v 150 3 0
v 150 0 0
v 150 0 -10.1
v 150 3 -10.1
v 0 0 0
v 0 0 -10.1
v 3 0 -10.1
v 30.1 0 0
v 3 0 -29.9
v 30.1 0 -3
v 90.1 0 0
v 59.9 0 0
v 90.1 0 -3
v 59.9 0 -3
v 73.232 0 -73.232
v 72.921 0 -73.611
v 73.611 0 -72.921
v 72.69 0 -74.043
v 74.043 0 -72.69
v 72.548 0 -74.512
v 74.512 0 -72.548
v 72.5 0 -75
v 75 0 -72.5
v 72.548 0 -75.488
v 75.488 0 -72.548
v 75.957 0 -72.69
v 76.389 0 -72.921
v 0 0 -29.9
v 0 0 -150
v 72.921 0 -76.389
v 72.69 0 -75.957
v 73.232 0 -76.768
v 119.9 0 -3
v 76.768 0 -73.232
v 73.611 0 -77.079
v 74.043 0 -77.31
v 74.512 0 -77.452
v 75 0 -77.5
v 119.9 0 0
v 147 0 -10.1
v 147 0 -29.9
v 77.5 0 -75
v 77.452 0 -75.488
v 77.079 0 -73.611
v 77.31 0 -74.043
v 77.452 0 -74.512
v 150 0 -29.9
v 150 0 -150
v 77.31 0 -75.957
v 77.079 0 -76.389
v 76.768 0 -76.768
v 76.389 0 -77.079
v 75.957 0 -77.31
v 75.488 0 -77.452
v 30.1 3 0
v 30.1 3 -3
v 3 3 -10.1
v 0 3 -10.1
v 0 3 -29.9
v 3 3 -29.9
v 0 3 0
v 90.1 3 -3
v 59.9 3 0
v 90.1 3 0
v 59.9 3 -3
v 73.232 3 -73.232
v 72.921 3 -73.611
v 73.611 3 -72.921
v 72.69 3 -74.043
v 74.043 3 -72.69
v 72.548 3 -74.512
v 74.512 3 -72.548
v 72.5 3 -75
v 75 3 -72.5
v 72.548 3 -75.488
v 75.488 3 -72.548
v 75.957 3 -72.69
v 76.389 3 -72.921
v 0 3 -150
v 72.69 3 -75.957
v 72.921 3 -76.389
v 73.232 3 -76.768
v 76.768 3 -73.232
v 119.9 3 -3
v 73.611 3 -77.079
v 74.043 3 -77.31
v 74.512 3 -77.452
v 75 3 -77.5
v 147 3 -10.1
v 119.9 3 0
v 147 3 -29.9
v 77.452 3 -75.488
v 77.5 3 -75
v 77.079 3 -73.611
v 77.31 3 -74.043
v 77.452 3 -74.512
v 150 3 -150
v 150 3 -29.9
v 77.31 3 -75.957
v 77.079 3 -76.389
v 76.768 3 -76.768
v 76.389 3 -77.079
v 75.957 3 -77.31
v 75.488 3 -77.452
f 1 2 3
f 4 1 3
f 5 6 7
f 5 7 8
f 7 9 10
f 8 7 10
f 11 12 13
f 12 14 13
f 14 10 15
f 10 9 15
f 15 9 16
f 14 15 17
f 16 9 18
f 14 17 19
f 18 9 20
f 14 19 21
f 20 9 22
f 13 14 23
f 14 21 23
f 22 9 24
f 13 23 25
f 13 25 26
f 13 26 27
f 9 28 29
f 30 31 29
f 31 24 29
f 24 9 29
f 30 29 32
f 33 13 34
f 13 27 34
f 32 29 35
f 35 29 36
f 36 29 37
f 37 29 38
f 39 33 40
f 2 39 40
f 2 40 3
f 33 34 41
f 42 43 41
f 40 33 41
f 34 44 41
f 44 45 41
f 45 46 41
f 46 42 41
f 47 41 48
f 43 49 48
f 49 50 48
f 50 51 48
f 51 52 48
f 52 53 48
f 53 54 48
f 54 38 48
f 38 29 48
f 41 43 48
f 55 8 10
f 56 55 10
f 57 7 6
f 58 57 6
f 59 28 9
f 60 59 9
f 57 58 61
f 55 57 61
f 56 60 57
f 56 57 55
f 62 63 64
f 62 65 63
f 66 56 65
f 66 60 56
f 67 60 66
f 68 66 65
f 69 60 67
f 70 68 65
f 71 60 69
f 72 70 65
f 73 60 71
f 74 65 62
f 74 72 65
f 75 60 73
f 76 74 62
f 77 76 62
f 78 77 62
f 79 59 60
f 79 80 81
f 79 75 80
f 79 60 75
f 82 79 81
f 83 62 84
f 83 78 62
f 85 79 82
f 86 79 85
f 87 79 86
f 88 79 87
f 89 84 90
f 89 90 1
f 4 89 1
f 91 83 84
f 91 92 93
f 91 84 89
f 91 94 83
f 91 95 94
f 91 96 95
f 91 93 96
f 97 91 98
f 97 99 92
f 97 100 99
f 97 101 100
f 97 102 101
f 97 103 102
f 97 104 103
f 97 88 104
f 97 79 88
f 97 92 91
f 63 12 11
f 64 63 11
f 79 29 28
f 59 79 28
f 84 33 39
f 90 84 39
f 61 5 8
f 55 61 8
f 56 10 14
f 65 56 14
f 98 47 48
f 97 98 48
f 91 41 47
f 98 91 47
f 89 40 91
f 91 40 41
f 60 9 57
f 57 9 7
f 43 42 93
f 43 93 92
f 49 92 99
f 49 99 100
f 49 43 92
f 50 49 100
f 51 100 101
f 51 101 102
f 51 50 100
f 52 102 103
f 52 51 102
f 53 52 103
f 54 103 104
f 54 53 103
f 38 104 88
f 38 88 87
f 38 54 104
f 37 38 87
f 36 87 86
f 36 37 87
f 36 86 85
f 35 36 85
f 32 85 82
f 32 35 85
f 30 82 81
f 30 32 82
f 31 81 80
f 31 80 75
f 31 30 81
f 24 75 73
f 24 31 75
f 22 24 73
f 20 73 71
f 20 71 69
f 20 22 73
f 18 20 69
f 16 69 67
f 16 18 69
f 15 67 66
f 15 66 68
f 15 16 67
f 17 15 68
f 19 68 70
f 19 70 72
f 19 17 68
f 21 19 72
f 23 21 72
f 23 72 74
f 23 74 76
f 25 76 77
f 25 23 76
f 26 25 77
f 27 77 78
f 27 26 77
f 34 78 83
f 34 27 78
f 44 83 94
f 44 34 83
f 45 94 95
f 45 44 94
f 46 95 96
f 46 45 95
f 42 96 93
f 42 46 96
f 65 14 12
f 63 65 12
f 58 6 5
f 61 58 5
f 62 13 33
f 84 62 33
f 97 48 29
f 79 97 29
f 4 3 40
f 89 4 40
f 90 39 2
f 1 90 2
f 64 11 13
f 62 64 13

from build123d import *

# Parameters (mm, degrees)
SKETCH1_R           = 2.5
BOSS_EXTRUDE1_DEPTH = 3


with BuildPart() as part:
    # Sketch1 → Boss-Extrude1 (new body)
    with BuildSketch(Plane(origin=(0, 0, 0), x_dir=(1, 0, 0), z_dir=(0, 1, 0))):
        Polygon((59.9, 0), (90.1, 0), (90.1, 3), (119.9, 3), (119.9, 0), (150, 0), (150, 10.1), (147, 10.1), (147, 29.9), (150, 29.9), (150, 150), (0, 150), (0, 29.9), (3, 29.9), (3, 10.1), (0, 10.1), (0, 0), (30.1, 0), (30.1, 3), (59.9, 3), align=None)
        with Locations((75, 75)):
            Circle(SKETCH1_R, mode=Mode.SUBTRACT)
    extrude(amount=BOSS_EXTRUDE1_DEPTH)


solid = part.part
